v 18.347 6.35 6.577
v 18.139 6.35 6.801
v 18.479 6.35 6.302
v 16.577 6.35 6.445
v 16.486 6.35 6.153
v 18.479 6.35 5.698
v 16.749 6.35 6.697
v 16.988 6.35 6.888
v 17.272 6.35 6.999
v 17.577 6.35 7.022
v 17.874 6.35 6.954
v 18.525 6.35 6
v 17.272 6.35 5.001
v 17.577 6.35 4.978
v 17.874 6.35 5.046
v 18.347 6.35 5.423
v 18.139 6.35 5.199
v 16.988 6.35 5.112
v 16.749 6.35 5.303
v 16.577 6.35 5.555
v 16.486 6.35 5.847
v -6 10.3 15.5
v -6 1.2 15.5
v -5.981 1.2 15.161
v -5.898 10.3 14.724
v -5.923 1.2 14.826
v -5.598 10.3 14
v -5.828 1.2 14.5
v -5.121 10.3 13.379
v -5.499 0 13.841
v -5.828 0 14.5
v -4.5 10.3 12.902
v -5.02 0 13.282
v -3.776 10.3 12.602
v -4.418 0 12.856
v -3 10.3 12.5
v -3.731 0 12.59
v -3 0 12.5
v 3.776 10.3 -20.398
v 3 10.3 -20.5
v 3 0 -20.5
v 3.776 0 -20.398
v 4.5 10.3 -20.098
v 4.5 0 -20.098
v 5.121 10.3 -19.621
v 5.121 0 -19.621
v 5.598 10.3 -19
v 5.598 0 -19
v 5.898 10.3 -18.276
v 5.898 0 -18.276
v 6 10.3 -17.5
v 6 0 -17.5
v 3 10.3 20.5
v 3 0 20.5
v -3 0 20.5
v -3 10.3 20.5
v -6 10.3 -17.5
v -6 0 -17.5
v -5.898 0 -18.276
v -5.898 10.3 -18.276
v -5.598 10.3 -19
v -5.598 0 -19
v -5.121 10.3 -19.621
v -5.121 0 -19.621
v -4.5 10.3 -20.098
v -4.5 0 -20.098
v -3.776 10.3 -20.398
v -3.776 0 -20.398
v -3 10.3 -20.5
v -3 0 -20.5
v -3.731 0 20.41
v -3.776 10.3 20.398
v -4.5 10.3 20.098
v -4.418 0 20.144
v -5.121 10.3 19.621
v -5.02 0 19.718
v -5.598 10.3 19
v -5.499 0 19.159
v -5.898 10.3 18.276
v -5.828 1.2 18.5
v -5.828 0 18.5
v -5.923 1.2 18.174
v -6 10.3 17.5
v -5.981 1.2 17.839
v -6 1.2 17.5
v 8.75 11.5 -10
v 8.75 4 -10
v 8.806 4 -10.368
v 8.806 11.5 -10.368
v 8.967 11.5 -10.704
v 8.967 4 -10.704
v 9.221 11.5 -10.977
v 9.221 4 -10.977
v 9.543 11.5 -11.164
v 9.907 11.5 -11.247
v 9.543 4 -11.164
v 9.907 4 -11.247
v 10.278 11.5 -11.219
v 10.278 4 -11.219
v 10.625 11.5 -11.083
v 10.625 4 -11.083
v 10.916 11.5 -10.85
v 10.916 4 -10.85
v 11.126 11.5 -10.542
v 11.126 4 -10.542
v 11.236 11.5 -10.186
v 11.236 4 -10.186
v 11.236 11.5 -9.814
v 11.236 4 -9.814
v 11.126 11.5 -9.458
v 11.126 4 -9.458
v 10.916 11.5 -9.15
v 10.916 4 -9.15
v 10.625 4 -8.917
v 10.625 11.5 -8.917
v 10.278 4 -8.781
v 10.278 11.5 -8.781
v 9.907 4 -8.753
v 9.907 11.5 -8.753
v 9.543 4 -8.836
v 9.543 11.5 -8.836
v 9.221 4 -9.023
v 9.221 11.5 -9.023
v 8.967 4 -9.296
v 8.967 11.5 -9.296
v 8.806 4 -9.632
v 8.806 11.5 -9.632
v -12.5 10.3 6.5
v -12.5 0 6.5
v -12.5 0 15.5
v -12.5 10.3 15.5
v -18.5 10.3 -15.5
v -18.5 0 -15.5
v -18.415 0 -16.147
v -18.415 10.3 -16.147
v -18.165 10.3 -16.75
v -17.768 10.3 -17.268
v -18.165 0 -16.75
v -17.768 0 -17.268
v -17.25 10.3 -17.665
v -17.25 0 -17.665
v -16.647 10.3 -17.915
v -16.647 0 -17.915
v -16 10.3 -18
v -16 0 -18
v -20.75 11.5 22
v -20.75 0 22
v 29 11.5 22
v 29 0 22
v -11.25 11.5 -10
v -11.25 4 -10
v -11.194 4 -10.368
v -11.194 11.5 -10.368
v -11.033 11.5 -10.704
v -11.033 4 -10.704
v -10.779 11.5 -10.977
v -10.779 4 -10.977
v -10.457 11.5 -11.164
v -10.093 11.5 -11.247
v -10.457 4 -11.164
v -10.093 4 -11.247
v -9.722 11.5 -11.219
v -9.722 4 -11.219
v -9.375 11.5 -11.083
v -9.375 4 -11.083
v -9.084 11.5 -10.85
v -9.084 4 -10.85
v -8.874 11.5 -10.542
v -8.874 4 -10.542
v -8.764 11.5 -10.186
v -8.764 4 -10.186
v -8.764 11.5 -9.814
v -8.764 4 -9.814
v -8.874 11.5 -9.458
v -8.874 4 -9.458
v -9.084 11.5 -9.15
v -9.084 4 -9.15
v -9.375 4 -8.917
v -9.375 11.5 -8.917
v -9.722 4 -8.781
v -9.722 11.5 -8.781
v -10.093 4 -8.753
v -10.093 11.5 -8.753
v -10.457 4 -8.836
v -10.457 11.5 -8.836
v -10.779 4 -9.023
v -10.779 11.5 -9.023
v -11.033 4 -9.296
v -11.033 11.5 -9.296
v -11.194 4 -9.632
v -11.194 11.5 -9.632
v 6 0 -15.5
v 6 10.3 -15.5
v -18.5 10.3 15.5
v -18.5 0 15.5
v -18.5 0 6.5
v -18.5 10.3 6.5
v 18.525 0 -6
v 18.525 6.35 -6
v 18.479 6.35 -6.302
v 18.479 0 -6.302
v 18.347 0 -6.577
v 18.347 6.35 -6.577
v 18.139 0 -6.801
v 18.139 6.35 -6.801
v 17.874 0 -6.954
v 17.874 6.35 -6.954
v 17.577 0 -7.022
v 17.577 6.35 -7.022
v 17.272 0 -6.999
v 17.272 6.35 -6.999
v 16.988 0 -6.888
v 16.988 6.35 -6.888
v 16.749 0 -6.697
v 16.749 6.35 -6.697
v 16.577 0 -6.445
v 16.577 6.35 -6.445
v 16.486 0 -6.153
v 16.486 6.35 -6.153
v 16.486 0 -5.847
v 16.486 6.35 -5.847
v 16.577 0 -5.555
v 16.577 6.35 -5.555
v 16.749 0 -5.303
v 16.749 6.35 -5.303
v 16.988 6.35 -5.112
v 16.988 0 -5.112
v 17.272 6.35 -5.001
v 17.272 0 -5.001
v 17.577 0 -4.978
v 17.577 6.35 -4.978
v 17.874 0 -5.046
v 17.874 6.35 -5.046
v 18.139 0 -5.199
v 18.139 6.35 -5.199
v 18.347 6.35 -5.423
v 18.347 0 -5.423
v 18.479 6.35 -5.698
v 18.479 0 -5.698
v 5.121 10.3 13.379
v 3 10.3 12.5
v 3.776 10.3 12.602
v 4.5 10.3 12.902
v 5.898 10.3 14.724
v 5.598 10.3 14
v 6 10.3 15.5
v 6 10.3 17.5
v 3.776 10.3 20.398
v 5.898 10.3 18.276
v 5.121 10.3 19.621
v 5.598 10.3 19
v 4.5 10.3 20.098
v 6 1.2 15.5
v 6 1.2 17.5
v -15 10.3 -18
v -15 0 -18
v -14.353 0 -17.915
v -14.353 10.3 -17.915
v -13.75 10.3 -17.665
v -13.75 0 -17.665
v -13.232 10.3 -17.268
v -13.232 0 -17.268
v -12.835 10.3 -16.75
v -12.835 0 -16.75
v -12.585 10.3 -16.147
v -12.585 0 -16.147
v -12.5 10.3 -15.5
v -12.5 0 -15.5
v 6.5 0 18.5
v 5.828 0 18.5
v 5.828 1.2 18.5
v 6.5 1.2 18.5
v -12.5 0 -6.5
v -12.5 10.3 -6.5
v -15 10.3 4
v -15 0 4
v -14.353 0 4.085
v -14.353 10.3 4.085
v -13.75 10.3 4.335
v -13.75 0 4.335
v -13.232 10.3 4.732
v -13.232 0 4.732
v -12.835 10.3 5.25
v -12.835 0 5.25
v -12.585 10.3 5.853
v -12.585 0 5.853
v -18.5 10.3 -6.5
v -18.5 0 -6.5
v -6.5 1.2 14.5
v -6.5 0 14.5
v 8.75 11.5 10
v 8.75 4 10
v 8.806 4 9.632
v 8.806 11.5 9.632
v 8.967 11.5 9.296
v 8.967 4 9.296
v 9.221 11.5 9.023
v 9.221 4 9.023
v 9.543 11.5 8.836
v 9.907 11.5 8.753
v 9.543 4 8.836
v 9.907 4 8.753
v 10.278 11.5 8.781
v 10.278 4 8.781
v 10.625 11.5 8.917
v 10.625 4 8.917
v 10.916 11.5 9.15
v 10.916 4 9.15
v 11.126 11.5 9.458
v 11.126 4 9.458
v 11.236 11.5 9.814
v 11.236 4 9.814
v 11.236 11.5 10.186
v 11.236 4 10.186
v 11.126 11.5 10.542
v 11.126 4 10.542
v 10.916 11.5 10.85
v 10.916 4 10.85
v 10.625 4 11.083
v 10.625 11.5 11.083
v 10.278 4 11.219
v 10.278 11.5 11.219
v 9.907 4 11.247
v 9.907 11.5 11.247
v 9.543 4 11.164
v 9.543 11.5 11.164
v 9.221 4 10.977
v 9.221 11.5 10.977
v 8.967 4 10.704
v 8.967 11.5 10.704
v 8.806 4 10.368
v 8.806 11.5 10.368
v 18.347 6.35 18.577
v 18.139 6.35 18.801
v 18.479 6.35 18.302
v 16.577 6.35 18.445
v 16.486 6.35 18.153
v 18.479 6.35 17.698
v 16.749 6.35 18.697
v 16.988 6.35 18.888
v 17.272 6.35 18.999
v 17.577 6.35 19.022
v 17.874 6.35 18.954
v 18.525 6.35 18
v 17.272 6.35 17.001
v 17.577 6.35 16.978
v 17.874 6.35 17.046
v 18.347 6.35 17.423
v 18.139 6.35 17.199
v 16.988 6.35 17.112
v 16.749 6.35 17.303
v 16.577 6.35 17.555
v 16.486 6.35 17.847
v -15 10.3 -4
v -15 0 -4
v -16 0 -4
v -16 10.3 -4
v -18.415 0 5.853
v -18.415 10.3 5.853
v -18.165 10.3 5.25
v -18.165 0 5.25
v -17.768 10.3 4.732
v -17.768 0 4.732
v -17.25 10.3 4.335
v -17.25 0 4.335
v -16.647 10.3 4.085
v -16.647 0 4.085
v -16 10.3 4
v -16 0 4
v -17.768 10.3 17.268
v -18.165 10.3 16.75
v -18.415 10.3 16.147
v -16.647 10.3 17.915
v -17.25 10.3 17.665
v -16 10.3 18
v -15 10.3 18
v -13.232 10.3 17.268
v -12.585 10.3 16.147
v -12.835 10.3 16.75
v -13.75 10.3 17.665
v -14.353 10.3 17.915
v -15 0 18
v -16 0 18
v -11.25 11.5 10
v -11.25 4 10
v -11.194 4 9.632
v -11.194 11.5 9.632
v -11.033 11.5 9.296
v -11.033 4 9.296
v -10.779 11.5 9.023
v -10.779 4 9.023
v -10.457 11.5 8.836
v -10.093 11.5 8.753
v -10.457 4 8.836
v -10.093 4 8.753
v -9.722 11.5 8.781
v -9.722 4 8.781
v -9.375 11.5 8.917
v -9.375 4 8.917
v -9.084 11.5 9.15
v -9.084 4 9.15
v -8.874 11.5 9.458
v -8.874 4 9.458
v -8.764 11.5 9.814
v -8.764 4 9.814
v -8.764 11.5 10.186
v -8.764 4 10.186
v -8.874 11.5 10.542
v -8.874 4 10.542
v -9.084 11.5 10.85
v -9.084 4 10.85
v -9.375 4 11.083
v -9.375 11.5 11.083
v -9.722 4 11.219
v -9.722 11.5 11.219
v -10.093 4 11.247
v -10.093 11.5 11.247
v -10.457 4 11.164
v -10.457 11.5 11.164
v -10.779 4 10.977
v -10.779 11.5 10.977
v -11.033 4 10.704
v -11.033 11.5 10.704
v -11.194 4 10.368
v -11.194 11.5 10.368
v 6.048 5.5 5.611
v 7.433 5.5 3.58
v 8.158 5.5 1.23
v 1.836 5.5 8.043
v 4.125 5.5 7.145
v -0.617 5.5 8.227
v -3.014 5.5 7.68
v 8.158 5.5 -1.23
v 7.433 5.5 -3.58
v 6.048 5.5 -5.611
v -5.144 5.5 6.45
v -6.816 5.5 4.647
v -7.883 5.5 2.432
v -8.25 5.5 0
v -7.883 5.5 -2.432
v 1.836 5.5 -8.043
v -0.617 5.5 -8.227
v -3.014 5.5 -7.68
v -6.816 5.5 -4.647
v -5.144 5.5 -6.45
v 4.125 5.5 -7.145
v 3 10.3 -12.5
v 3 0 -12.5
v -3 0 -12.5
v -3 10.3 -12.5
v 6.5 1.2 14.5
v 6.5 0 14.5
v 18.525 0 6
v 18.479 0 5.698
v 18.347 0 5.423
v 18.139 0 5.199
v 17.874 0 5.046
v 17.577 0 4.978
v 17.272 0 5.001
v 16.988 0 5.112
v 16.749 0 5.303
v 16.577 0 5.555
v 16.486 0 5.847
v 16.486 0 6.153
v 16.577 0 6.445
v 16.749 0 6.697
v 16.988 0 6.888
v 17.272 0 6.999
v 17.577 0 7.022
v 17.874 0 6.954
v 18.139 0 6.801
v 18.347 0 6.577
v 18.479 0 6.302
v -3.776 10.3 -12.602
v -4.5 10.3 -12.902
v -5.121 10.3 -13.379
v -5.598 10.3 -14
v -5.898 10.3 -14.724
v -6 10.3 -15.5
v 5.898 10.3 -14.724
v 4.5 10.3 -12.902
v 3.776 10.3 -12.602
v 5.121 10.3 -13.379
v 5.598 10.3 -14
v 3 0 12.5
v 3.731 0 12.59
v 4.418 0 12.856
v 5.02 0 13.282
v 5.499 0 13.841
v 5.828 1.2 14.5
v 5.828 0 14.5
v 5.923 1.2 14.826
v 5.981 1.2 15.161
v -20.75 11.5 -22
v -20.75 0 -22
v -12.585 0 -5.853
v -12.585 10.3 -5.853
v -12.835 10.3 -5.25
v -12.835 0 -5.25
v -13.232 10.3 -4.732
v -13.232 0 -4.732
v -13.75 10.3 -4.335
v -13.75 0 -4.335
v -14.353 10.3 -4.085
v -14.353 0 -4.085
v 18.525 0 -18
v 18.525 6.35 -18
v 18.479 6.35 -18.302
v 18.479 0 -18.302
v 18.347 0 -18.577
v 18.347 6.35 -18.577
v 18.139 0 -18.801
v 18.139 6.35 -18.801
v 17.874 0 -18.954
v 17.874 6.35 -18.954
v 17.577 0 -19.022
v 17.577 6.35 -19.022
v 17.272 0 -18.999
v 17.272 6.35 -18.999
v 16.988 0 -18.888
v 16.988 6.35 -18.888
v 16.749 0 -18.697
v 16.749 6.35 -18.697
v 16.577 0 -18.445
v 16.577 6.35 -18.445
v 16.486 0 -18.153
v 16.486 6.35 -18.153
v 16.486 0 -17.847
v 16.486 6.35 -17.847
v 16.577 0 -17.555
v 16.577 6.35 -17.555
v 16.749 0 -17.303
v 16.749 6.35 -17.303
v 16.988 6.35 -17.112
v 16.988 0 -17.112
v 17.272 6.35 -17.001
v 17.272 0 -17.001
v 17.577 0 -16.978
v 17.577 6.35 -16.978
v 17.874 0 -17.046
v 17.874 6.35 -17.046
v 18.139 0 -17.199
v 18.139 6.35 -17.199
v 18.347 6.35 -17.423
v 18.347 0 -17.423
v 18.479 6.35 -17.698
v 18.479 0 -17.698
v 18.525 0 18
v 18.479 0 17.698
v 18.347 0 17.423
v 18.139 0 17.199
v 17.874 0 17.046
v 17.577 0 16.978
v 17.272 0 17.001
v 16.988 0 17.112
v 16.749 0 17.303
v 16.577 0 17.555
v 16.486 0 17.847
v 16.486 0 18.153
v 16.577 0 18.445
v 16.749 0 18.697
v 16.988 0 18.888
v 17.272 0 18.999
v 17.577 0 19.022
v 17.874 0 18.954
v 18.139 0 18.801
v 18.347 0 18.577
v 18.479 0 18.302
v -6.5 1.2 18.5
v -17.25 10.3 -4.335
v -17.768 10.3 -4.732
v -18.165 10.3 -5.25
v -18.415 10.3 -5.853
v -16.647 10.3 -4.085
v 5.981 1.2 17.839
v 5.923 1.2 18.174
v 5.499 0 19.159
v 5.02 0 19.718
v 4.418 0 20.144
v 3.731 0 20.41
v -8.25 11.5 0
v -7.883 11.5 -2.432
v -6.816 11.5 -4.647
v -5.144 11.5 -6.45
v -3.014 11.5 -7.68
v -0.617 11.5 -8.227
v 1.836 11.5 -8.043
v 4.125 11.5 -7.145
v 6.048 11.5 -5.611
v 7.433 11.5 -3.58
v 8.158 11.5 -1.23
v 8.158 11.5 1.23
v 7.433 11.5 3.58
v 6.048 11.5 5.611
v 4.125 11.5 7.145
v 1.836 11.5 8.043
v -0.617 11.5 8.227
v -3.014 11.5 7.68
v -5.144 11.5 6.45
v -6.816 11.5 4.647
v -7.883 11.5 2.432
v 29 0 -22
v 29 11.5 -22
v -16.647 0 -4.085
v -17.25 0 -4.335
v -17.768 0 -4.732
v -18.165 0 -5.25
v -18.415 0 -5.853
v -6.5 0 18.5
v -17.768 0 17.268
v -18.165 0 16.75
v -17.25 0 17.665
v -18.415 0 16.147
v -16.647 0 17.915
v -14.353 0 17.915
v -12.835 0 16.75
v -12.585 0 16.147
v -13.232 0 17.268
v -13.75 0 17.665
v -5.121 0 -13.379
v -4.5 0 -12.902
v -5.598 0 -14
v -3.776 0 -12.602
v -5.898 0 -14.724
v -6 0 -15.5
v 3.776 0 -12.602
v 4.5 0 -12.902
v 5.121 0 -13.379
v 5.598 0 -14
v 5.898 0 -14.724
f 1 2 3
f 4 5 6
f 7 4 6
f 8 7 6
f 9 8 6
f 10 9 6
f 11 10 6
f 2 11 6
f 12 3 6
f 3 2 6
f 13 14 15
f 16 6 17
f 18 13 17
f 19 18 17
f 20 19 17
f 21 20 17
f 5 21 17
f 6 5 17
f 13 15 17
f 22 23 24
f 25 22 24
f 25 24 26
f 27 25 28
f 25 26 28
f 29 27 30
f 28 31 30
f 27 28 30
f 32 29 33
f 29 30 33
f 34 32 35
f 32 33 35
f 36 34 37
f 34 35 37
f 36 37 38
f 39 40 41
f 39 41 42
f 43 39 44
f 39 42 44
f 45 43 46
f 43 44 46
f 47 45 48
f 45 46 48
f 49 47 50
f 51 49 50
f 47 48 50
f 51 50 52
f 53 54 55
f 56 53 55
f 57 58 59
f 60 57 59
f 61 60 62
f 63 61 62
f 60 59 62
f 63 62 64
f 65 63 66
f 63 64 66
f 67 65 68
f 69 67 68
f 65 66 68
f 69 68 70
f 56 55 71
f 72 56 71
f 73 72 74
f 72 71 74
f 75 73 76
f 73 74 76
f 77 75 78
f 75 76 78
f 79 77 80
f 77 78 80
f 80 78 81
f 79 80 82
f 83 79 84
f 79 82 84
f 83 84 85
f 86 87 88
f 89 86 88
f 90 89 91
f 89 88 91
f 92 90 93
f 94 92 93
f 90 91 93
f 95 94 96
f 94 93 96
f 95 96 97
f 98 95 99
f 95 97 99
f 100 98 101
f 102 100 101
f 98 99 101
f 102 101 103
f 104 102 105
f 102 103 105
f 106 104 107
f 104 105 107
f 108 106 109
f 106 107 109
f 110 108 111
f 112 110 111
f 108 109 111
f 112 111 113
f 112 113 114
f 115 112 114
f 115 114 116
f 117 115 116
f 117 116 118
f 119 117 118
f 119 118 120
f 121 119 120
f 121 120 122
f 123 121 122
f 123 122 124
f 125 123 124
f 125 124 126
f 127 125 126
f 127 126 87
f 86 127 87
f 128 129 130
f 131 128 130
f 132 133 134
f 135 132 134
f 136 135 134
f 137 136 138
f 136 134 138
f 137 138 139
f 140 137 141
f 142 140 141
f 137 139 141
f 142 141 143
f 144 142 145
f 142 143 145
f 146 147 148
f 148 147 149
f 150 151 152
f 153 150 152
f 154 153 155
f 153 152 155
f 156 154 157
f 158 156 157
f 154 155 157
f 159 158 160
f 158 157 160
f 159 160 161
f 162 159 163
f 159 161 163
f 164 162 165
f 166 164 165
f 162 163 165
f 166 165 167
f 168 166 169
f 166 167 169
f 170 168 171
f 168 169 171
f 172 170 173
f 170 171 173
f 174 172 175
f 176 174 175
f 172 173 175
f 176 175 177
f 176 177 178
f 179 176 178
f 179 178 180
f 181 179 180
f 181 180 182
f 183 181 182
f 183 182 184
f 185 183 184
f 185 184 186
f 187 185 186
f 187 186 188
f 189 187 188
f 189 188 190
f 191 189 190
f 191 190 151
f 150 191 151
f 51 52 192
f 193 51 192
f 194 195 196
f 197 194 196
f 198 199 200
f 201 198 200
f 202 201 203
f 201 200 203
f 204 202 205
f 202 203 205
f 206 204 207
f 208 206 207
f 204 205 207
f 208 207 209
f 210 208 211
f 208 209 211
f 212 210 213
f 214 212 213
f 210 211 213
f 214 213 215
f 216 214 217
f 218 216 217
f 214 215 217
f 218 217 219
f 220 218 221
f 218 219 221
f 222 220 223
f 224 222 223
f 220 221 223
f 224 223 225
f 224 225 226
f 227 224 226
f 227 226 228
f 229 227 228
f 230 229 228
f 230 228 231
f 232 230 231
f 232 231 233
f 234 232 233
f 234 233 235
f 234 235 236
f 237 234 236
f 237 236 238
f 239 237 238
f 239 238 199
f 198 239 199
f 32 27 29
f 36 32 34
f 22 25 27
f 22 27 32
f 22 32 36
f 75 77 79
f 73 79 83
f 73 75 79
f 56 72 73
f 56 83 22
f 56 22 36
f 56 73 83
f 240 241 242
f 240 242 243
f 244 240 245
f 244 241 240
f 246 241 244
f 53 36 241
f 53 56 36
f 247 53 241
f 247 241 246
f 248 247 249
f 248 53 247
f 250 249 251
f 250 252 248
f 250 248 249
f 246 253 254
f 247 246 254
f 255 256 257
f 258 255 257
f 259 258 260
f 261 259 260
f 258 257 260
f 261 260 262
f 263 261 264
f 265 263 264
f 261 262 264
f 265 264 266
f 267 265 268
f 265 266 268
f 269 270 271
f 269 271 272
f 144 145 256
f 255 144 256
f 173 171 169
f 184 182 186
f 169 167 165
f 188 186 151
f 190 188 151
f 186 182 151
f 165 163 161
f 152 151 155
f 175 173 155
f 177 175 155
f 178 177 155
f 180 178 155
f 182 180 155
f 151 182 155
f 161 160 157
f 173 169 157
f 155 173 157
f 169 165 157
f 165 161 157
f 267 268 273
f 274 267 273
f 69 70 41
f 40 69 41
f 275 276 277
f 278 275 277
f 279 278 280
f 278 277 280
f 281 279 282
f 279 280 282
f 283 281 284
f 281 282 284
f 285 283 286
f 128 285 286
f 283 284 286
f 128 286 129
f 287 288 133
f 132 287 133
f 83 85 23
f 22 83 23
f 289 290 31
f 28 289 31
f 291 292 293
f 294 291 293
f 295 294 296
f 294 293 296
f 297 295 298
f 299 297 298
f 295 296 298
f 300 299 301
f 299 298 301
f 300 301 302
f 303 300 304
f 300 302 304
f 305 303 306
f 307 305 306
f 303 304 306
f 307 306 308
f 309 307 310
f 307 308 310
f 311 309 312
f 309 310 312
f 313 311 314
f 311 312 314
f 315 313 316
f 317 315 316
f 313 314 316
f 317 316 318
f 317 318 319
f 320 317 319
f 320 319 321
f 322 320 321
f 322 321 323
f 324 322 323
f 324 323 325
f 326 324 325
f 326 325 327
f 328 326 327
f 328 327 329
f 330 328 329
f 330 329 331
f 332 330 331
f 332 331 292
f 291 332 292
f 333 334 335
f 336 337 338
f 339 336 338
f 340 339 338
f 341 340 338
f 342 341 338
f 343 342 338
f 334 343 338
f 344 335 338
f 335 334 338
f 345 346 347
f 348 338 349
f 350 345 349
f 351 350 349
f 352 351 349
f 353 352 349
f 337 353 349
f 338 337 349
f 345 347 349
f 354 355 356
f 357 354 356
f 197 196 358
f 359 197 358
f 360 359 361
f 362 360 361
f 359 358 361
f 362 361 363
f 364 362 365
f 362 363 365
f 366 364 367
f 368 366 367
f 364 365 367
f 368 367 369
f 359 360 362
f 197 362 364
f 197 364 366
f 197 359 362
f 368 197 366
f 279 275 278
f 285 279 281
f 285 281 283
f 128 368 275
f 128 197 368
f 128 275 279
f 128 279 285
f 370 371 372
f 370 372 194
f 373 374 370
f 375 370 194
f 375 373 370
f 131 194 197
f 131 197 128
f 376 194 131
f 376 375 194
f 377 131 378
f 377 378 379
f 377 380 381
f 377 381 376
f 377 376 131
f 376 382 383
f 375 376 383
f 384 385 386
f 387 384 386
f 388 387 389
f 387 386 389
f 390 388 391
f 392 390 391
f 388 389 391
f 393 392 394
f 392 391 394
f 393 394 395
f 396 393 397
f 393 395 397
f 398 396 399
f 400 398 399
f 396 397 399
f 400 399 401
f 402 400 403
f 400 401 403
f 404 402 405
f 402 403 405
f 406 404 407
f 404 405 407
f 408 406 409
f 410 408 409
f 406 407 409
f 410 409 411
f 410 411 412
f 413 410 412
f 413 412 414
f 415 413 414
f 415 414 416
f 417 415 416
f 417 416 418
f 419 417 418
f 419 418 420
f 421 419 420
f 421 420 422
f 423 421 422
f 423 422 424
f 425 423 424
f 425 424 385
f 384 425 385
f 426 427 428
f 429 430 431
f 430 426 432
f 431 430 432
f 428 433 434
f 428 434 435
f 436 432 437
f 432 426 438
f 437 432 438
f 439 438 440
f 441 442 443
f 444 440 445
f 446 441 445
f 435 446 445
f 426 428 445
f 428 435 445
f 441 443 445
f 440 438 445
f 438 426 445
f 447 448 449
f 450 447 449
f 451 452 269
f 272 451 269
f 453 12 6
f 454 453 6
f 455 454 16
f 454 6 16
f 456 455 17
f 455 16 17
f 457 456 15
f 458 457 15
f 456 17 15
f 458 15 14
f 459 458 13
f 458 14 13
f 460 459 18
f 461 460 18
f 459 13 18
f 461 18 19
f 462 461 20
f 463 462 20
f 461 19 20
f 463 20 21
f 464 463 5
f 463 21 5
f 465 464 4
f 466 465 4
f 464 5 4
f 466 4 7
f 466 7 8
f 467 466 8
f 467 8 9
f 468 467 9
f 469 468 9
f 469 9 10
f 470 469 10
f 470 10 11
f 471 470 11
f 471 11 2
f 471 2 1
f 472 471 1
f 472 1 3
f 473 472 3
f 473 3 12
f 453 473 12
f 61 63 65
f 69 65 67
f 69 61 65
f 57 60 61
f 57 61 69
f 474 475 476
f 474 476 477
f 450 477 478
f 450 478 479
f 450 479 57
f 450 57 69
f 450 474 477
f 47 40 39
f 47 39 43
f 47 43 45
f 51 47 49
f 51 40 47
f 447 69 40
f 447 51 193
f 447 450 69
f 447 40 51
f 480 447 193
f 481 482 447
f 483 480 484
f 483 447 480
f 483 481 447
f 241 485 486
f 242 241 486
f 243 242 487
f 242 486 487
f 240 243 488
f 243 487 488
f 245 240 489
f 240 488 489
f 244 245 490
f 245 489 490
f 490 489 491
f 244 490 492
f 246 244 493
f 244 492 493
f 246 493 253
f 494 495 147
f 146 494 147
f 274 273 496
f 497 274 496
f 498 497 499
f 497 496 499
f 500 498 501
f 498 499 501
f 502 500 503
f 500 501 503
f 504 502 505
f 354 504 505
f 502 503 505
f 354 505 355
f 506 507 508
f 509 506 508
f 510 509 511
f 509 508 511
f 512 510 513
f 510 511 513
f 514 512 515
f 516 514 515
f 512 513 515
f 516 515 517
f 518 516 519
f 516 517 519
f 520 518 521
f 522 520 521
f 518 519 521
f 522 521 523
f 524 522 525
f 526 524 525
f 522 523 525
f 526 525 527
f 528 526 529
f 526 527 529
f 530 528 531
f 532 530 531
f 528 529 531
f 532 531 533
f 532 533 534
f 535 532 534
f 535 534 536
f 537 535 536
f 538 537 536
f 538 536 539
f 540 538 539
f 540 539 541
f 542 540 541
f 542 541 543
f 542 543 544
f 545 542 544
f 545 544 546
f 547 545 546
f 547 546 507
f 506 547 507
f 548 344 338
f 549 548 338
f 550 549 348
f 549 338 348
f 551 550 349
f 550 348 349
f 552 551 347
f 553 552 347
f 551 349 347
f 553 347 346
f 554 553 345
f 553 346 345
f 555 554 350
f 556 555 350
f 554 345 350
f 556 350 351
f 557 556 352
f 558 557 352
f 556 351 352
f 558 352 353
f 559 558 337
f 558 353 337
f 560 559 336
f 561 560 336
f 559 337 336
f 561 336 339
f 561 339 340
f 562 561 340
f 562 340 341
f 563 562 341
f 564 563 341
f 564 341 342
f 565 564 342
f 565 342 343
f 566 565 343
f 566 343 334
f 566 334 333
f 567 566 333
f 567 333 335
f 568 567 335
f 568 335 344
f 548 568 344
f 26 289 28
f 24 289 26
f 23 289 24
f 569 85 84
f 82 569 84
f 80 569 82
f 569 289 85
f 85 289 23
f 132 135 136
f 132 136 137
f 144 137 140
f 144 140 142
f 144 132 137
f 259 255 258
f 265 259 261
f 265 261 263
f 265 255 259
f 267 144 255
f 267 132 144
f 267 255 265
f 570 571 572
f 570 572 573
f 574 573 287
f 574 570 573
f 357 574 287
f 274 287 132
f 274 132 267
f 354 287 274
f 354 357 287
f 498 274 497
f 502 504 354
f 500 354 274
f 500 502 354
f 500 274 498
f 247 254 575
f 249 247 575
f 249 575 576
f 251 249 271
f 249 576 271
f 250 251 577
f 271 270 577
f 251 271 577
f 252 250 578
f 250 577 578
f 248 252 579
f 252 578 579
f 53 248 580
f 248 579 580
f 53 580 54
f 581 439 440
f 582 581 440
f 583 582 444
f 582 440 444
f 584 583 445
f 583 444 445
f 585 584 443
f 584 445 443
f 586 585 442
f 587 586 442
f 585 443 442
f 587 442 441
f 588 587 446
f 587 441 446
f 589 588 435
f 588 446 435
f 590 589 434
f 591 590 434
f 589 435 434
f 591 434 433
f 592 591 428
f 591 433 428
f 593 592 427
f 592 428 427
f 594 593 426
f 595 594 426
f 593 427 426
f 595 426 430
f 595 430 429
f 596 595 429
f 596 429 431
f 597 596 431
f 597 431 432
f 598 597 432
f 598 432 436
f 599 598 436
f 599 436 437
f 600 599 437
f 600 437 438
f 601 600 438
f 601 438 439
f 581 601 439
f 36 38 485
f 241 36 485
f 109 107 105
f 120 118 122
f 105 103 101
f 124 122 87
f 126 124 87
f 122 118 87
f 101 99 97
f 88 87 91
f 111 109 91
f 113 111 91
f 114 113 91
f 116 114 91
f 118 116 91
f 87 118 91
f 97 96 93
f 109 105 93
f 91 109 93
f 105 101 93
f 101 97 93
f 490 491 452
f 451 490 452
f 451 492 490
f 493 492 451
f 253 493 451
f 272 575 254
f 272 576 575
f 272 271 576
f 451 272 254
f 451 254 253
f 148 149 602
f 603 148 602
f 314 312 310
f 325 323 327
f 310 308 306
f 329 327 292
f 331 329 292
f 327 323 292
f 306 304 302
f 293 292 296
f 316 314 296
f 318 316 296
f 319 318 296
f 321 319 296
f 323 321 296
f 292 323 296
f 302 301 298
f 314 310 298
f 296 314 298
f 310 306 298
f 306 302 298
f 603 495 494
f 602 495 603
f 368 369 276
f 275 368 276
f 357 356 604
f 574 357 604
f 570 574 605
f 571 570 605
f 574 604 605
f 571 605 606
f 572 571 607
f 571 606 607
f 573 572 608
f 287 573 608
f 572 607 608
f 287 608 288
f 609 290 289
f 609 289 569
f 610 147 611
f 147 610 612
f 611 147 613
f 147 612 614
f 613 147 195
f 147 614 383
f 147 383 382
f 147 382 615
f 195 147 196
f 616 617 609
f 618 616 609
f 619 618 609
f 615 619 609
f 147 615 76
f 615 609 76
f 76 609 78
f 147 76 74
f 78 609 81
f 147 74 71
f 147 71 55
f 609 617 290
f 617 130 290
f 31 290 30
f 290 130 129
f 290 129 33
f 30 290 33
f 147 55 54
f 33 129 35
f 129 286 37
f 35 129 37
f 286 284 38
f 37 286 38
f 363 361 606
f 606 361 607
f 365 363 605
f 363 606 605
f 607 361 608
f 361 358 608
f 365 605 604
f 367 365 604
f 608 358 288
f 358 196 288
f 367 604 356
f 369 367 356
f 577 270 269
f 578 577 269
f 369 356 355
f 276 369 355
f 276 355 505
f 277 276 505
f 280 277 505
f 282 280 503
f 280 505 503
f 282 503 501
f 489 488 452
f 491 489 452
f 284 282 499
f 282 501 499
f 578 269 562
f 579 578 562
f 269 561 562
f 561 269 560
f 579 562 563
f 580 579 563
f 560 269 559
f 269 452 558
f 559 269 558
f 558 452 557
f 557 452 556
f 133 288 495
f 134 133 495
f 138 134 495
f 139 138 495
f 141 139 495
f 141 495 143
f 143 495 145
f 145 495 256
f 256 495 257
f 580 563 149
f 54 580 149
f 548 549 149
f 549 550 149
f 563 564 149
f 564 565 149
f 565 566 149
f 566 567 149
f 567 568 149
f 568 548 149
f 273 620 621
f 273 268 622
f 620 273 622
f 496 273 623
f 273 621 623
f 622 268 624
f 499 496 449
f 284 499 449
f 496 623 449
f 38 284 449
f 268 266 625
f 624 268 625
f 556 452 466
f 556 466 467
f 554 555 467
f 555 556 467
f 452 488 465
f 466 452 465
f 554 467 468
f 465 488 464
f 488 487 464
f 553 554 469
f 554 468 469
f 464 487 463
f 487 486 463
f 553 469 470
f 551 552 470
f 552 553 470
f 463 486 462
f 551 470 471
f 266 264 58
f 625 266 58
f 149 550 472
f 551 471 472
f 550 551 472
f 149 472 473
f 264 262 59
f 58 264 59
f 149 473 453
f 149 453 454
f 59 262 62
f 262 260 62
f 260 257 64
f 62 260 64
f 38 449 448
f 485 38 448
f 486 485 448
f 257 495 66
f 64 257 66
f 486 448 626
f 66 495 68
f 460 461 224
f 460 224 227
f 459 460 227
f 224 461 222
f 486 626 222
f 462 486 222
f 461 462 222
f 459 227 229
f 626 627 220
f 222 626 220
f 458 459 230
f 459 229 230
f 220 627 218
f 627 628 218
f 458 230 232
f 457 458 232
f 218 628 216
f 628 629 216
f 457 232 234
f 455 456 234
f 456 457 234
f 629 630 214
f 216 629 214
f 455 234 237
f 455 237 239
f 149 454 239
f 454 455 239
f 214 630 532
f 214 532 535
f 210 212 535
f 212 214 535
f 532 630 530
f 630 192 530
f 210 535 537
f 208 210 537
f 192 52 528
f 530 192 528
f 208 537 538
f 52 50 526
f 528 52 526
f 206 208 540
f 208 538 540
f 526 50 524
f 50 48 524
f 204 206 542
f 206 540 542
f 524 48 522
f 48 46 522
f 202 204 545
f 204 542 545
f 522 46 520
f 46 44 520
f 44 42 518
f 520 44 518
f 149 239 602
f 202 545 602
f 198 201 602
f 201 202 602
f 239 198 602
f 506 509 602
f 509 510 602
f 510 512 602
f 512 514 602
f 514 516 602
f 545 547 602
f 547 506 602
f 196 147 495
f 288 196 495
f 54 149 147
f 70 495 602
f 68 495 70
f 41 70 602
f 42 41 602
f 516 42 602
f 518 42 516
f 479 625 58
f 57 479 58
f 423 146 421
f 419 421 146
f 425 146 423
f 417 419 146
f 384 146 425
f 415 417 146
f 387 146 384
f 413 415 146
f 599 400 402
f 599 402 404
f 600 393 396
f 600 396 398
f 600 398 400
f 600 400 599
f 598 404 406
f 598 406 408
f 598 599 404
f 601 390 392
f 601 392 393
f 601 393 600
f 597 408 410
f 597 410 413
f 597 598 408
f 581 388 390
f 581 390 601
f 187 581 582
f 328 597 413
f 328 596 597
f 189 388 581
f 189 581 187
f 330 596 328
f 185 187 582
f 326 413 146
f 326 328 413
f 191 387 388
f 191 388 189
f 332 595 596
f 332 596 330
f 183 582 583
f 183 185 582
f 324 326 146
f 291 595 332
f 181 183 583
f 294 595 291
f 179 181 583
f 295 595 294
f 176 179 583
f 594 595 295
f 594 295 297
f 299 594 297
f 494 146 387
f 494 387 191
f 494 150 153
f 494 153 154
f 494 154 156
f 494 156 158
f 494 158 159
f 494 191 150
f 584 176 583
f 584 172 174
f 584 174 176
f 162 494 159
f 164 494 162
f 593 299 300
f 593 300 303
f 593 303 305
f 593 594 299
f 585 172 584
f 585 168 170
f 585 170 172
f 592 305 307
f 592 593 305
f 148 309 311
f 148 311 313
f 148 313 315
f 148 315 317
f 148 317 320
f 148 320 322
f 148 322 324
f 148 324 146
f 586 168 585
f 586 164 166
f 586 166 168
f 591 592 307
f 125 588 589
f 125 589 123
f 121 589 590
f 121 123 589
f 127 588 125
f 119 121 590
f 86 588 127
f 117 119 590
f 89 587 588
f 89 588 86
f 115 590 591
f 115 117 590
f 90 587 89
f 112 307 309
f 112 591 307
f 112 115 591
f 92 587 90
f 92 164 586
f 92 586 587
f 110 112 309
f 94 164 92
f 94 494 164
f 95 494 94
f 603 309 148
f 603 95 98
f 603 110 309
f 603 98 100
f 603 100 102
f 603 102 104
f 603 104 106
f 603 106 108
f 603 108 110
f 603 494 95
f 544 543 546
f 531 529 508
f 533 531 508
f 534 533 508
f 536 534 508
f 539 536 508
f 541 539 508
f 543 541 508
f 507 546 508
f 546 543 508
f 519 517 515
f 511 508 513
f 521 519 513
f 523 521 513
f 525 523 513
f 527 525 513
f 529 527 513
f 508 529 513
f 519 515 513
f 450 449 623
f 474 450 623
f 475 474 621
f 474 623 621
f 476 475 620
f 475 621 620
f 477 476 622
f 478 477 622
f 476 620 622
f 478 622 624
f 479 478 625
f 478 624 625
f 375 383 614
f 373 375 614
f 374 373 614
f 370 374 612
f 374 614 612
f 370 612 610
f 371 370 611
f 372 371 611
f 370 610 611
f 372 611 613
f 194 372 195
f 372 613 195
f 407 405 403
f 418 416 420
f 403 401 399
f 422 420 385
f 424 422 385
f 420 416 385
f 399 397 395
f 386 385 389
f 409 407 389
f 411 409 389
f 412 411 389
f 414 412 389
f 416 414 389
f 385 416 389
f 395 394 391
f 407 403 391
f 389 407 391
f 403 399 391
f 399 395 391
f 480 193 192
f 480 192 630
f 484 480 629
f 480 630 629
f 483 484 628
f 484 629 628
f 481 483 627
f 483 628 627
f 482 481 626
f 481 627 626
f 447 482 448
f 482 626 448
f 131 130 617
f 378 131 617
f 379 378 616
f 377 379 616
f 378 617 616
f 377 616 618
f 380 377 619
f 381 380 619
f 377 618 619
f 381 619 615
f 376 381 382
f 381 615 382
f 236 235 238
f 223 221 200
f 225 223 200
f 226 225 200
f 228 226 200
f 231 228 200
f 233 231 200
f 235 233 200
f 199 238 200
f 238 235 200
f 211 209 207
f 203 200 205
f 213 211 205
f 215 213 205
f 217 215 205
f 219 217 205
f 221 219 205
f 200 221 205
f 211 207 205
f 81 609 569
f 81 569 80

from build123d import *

# Parameters (mm, degrees)
SKETCH1_W                        = 58
SKETCH1_H                        = 44
BOSS_EXTRUDE1_DEPTH              = 11.5
F_16_5_16_5_DIAMETER_HOLE1_D     = 16.5
F_16_5_16_5_DIAMETER_HOLE1_DEPTH = 6
M3X0_5_TAPPED_HOLE1_D            = 2.5
M3X0_5_TAPPED_HOLE1_DEPTH        = 7.5
CUT_EXTRUDE1_DEPTH               = 10.3
CUT_EXTRUDE2_DEPTH               = 10.3
SKETCH13_W                       = 8.25
SKETCH13_H                       = 44
CUT_EXTRUDE3_DEPTH               = 39.173943993
M2_5X0_45_TAPPED_HOLE1_D         = 2.05
M2_5X0_45_TAPPED_HOLE1_DEPTH     = 6.35
SKETCH16_W                       = 13
SKETCH16_H                       = 4
CUT_EXTRUDE4_DEPTH               = 1.2


with BuildPart() as part:
    # Sketch1 → Boss-Extrude1 (new body)
    with BuildSketch(Plane(origin=(0, 0, 0), x_dir=(1, 0, 0), z_dir=(0, 1, 0))):
        Rectangle(SKETCH1_W, SKETCH1_H)
    extrude(amount=BOSS_EXTRUDE1_DEPTH)

    # Ø16.5 (16.5) Diameter Hole1
    with Locations(Plane(origin=(0, 11.5, 0), x_dir=(1, 0, 0), z_dir=(0, 1, 0))):
        with Locations((0, 0)):
            Hole(F_16_5_16_5_DIAMETER_HOLE1_D / 2, depth=F_16_5_16_5_DIAMETER_HOLE1_DEPTH)

    # M3x0.5 Tapped Hole1
    with Locations(Plane(origin=(0, 11.5, 0), x_dir=(1, 0, 0), z_dir=(0, 1, 0))):
        with Locations((-10, 10), (10, 10), (-10, -10), (10, -10)):
            Hole(M3X0_5_TAPPED_HOLE1_D / 2, depth=M3X0_5_TAPPED_HOLE1_DEPTH)

    # Sketch10 → Cut-Extrude1 (cut)
    with BuildSketch(Plane.XZ):
        with BuildLine():
            Line((3, 20.5), (-3, 20.5))
            ThreePointArc((-3, 20.5), (-5.121320344, 19.621320344), (-6, 17.5))
            Line((-6, 17.5), (-6, 15.5))
            ThreePointArc((-6, 15.5), (-5.121320344, 13.378679656), (-3, 12.5))
            Line((-3, 12.5), (3, 12.5))
            ThreePointArc((3, 12.5), (5.121320344, 13.378679656), (6, 15.5))
            Line((6, 15.5), (6, 17.5))
            ThreePointArc((6, 17.5), (5.121320344, 19.621320344), (3, 20.5))
        make_face()
        with BuildLine():
            Line((-6, -15.5), (-6, -17.499999942))
            ThreePointArc((-6, -17.499999942), (-5.121320364, -19.621320323), (-3, -20.5))
            Line((-3, -20.5), (3, -20.5))
            ThreePointArc((3, -20.5), (5.121320344, -19.621320344), (6, -17.5))
            Line((6, -17.5), (6, -15.5))
            ThreePointArc((6, -15.5), (5.121320344, -13.378679656), (3, -12.5))
            Line((3, -12.5), (-3, -12.5))
            ThreePointArc((-3, -12.5), (-5.121320344, -13.378679656), (-6, -15.5))
        make_face()
    extrude(amount=-CUT_EXTRUDE1_DEPTH, mode=Mode.SUBTRACT)

    # Sketch11 → Cut-Extrude2 (cut)
    with BuildSketch(Plane.XZ):
        with BuildLine():
            ThreePointArc((-12.5, 15.5), (-13.232233047, 17.267766953), (-15, 18))
            Line((-15, 18), (-16, 18))
            ThreePointArc((-16, 18), (-17.767766953, 17.267766953), (-18.5, 15.5))
            Line((-18.5, 15.5), (-18.5, 6.5))
            ThreePointArc((-18.5, 6.5), (-17.767766953, 4.732233047), (-16, 4))
            Line((-16, 4), (-15, 4))
            ThreePointArc((-15, 4), (-13.232233047, 4.732233047), (-12.5, 6.5))
            Line((-12.5, 6.5), (-12.5, 15.5))
        make_face()
        with BuildLine():
            ThreePointArc((-12.5, -6.5), (-13.232233047, -4.732233047), (-15, -4))
            Line((-15, -4), (-16, -4))
            ThreePointArc((-16, -4), (-17.767766953, -4.732233047), (-18.5, -6.5))
            Line((-18.5, -6.5), (-18.5, -15.5))
            ThreePointArc((-18.5, -15.5), (-17.767766953, -17.267766953), (-16, -18))
            Line((-16, -18), (-15, -18))
            ThreePointArc((-15, -18), (-13.232233047, -17.267766953), (-12.5, -15.5))
            Line((-12.5, -15.5), (-12.5, -6.5))
        make_face()
    extrude(amount=-CUT_EXTRUDE2_DEPTH, mode=Mode.SUBTRACT)

    # Sketch13 → Cut-Extrude3 (cut, through all)
    with BuildSketch(Plane.XZ):
        with Locations((-24.875, 0)):
            Rectangle(SKETCH13_W, SKETCH13_H)
    extrude(amount=-CUT_EXTRUDE3_DEPTH, mode=Mode.SUBTRACT)

    # M2.5x0.45 Tapped Hole1
    with Locations(Plane(origin=(0, 0, 0), x_dir=(-1, 0, 0), z_dir=(0, -1, 0))):
        with Locations((-17.5, 6), (-17.5, -6), (-17.5, -18), (-17.5, 18)):
            Hole(M2_5X0_45_TAPPED_HOLE1_D / 2, depth=M2_5X0_45_TAPPED_HOLE1_DEPTH)

    # Sketch16 → Cut-Extrude4 (cut)
    with BuildSketch(Plane.XZ):
        with Locations((0, 16.5)):
            Rectangle(SKETCH16_W, SKETCH16_H)
    extrude(amount=-CUT_EXTRUDE4_DEPTH, mode=Mode.SUBTRACT)


solid = part.part
